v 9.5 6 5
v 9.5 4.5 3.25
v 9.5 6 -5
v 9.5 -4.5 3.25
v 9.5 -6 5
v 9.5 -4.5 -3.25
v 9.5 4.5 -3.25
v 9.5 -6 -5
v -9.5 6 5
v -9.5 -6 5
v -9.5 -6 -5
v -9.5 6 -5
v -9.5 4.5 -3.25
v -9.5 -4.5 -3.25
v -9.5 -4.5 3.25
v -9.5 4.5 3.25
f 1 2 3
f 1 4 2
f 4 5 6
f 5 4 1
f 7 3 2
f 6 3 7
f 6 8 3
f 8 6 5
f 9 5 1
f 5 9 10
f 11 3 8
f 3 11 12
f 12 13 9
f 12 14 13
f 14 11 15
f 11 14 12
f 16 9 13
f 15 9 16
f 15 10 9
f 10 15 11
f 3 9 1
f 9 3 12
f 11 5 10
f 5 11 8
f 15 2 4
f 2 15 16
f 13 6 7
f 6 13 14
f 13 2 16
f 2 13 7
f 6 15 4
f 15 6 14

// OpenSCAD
chainLoop();

module chainLoop(yScale = 12,
                 zScale = 10)
{
    xScale = 19;

    difference()
    {
        color("green")
        cube([xScale, yScale, zScale], center=true);
                
        cutout(xScale, yScale, zScale);
    }
}

module cutout(xScale, yScale, zScale)
{
    yTranslate = 0;
    zTranslate = 0;
        
    translate([0, yTranslate, zTranslate])
    cube([xScale+1, yScale*0.75, zScale*0.65], center=true);
//    cube([xScale*0.75, yScale+1, zScale*0.65], center=true);   // this is the cutout on the Y axis    
}
